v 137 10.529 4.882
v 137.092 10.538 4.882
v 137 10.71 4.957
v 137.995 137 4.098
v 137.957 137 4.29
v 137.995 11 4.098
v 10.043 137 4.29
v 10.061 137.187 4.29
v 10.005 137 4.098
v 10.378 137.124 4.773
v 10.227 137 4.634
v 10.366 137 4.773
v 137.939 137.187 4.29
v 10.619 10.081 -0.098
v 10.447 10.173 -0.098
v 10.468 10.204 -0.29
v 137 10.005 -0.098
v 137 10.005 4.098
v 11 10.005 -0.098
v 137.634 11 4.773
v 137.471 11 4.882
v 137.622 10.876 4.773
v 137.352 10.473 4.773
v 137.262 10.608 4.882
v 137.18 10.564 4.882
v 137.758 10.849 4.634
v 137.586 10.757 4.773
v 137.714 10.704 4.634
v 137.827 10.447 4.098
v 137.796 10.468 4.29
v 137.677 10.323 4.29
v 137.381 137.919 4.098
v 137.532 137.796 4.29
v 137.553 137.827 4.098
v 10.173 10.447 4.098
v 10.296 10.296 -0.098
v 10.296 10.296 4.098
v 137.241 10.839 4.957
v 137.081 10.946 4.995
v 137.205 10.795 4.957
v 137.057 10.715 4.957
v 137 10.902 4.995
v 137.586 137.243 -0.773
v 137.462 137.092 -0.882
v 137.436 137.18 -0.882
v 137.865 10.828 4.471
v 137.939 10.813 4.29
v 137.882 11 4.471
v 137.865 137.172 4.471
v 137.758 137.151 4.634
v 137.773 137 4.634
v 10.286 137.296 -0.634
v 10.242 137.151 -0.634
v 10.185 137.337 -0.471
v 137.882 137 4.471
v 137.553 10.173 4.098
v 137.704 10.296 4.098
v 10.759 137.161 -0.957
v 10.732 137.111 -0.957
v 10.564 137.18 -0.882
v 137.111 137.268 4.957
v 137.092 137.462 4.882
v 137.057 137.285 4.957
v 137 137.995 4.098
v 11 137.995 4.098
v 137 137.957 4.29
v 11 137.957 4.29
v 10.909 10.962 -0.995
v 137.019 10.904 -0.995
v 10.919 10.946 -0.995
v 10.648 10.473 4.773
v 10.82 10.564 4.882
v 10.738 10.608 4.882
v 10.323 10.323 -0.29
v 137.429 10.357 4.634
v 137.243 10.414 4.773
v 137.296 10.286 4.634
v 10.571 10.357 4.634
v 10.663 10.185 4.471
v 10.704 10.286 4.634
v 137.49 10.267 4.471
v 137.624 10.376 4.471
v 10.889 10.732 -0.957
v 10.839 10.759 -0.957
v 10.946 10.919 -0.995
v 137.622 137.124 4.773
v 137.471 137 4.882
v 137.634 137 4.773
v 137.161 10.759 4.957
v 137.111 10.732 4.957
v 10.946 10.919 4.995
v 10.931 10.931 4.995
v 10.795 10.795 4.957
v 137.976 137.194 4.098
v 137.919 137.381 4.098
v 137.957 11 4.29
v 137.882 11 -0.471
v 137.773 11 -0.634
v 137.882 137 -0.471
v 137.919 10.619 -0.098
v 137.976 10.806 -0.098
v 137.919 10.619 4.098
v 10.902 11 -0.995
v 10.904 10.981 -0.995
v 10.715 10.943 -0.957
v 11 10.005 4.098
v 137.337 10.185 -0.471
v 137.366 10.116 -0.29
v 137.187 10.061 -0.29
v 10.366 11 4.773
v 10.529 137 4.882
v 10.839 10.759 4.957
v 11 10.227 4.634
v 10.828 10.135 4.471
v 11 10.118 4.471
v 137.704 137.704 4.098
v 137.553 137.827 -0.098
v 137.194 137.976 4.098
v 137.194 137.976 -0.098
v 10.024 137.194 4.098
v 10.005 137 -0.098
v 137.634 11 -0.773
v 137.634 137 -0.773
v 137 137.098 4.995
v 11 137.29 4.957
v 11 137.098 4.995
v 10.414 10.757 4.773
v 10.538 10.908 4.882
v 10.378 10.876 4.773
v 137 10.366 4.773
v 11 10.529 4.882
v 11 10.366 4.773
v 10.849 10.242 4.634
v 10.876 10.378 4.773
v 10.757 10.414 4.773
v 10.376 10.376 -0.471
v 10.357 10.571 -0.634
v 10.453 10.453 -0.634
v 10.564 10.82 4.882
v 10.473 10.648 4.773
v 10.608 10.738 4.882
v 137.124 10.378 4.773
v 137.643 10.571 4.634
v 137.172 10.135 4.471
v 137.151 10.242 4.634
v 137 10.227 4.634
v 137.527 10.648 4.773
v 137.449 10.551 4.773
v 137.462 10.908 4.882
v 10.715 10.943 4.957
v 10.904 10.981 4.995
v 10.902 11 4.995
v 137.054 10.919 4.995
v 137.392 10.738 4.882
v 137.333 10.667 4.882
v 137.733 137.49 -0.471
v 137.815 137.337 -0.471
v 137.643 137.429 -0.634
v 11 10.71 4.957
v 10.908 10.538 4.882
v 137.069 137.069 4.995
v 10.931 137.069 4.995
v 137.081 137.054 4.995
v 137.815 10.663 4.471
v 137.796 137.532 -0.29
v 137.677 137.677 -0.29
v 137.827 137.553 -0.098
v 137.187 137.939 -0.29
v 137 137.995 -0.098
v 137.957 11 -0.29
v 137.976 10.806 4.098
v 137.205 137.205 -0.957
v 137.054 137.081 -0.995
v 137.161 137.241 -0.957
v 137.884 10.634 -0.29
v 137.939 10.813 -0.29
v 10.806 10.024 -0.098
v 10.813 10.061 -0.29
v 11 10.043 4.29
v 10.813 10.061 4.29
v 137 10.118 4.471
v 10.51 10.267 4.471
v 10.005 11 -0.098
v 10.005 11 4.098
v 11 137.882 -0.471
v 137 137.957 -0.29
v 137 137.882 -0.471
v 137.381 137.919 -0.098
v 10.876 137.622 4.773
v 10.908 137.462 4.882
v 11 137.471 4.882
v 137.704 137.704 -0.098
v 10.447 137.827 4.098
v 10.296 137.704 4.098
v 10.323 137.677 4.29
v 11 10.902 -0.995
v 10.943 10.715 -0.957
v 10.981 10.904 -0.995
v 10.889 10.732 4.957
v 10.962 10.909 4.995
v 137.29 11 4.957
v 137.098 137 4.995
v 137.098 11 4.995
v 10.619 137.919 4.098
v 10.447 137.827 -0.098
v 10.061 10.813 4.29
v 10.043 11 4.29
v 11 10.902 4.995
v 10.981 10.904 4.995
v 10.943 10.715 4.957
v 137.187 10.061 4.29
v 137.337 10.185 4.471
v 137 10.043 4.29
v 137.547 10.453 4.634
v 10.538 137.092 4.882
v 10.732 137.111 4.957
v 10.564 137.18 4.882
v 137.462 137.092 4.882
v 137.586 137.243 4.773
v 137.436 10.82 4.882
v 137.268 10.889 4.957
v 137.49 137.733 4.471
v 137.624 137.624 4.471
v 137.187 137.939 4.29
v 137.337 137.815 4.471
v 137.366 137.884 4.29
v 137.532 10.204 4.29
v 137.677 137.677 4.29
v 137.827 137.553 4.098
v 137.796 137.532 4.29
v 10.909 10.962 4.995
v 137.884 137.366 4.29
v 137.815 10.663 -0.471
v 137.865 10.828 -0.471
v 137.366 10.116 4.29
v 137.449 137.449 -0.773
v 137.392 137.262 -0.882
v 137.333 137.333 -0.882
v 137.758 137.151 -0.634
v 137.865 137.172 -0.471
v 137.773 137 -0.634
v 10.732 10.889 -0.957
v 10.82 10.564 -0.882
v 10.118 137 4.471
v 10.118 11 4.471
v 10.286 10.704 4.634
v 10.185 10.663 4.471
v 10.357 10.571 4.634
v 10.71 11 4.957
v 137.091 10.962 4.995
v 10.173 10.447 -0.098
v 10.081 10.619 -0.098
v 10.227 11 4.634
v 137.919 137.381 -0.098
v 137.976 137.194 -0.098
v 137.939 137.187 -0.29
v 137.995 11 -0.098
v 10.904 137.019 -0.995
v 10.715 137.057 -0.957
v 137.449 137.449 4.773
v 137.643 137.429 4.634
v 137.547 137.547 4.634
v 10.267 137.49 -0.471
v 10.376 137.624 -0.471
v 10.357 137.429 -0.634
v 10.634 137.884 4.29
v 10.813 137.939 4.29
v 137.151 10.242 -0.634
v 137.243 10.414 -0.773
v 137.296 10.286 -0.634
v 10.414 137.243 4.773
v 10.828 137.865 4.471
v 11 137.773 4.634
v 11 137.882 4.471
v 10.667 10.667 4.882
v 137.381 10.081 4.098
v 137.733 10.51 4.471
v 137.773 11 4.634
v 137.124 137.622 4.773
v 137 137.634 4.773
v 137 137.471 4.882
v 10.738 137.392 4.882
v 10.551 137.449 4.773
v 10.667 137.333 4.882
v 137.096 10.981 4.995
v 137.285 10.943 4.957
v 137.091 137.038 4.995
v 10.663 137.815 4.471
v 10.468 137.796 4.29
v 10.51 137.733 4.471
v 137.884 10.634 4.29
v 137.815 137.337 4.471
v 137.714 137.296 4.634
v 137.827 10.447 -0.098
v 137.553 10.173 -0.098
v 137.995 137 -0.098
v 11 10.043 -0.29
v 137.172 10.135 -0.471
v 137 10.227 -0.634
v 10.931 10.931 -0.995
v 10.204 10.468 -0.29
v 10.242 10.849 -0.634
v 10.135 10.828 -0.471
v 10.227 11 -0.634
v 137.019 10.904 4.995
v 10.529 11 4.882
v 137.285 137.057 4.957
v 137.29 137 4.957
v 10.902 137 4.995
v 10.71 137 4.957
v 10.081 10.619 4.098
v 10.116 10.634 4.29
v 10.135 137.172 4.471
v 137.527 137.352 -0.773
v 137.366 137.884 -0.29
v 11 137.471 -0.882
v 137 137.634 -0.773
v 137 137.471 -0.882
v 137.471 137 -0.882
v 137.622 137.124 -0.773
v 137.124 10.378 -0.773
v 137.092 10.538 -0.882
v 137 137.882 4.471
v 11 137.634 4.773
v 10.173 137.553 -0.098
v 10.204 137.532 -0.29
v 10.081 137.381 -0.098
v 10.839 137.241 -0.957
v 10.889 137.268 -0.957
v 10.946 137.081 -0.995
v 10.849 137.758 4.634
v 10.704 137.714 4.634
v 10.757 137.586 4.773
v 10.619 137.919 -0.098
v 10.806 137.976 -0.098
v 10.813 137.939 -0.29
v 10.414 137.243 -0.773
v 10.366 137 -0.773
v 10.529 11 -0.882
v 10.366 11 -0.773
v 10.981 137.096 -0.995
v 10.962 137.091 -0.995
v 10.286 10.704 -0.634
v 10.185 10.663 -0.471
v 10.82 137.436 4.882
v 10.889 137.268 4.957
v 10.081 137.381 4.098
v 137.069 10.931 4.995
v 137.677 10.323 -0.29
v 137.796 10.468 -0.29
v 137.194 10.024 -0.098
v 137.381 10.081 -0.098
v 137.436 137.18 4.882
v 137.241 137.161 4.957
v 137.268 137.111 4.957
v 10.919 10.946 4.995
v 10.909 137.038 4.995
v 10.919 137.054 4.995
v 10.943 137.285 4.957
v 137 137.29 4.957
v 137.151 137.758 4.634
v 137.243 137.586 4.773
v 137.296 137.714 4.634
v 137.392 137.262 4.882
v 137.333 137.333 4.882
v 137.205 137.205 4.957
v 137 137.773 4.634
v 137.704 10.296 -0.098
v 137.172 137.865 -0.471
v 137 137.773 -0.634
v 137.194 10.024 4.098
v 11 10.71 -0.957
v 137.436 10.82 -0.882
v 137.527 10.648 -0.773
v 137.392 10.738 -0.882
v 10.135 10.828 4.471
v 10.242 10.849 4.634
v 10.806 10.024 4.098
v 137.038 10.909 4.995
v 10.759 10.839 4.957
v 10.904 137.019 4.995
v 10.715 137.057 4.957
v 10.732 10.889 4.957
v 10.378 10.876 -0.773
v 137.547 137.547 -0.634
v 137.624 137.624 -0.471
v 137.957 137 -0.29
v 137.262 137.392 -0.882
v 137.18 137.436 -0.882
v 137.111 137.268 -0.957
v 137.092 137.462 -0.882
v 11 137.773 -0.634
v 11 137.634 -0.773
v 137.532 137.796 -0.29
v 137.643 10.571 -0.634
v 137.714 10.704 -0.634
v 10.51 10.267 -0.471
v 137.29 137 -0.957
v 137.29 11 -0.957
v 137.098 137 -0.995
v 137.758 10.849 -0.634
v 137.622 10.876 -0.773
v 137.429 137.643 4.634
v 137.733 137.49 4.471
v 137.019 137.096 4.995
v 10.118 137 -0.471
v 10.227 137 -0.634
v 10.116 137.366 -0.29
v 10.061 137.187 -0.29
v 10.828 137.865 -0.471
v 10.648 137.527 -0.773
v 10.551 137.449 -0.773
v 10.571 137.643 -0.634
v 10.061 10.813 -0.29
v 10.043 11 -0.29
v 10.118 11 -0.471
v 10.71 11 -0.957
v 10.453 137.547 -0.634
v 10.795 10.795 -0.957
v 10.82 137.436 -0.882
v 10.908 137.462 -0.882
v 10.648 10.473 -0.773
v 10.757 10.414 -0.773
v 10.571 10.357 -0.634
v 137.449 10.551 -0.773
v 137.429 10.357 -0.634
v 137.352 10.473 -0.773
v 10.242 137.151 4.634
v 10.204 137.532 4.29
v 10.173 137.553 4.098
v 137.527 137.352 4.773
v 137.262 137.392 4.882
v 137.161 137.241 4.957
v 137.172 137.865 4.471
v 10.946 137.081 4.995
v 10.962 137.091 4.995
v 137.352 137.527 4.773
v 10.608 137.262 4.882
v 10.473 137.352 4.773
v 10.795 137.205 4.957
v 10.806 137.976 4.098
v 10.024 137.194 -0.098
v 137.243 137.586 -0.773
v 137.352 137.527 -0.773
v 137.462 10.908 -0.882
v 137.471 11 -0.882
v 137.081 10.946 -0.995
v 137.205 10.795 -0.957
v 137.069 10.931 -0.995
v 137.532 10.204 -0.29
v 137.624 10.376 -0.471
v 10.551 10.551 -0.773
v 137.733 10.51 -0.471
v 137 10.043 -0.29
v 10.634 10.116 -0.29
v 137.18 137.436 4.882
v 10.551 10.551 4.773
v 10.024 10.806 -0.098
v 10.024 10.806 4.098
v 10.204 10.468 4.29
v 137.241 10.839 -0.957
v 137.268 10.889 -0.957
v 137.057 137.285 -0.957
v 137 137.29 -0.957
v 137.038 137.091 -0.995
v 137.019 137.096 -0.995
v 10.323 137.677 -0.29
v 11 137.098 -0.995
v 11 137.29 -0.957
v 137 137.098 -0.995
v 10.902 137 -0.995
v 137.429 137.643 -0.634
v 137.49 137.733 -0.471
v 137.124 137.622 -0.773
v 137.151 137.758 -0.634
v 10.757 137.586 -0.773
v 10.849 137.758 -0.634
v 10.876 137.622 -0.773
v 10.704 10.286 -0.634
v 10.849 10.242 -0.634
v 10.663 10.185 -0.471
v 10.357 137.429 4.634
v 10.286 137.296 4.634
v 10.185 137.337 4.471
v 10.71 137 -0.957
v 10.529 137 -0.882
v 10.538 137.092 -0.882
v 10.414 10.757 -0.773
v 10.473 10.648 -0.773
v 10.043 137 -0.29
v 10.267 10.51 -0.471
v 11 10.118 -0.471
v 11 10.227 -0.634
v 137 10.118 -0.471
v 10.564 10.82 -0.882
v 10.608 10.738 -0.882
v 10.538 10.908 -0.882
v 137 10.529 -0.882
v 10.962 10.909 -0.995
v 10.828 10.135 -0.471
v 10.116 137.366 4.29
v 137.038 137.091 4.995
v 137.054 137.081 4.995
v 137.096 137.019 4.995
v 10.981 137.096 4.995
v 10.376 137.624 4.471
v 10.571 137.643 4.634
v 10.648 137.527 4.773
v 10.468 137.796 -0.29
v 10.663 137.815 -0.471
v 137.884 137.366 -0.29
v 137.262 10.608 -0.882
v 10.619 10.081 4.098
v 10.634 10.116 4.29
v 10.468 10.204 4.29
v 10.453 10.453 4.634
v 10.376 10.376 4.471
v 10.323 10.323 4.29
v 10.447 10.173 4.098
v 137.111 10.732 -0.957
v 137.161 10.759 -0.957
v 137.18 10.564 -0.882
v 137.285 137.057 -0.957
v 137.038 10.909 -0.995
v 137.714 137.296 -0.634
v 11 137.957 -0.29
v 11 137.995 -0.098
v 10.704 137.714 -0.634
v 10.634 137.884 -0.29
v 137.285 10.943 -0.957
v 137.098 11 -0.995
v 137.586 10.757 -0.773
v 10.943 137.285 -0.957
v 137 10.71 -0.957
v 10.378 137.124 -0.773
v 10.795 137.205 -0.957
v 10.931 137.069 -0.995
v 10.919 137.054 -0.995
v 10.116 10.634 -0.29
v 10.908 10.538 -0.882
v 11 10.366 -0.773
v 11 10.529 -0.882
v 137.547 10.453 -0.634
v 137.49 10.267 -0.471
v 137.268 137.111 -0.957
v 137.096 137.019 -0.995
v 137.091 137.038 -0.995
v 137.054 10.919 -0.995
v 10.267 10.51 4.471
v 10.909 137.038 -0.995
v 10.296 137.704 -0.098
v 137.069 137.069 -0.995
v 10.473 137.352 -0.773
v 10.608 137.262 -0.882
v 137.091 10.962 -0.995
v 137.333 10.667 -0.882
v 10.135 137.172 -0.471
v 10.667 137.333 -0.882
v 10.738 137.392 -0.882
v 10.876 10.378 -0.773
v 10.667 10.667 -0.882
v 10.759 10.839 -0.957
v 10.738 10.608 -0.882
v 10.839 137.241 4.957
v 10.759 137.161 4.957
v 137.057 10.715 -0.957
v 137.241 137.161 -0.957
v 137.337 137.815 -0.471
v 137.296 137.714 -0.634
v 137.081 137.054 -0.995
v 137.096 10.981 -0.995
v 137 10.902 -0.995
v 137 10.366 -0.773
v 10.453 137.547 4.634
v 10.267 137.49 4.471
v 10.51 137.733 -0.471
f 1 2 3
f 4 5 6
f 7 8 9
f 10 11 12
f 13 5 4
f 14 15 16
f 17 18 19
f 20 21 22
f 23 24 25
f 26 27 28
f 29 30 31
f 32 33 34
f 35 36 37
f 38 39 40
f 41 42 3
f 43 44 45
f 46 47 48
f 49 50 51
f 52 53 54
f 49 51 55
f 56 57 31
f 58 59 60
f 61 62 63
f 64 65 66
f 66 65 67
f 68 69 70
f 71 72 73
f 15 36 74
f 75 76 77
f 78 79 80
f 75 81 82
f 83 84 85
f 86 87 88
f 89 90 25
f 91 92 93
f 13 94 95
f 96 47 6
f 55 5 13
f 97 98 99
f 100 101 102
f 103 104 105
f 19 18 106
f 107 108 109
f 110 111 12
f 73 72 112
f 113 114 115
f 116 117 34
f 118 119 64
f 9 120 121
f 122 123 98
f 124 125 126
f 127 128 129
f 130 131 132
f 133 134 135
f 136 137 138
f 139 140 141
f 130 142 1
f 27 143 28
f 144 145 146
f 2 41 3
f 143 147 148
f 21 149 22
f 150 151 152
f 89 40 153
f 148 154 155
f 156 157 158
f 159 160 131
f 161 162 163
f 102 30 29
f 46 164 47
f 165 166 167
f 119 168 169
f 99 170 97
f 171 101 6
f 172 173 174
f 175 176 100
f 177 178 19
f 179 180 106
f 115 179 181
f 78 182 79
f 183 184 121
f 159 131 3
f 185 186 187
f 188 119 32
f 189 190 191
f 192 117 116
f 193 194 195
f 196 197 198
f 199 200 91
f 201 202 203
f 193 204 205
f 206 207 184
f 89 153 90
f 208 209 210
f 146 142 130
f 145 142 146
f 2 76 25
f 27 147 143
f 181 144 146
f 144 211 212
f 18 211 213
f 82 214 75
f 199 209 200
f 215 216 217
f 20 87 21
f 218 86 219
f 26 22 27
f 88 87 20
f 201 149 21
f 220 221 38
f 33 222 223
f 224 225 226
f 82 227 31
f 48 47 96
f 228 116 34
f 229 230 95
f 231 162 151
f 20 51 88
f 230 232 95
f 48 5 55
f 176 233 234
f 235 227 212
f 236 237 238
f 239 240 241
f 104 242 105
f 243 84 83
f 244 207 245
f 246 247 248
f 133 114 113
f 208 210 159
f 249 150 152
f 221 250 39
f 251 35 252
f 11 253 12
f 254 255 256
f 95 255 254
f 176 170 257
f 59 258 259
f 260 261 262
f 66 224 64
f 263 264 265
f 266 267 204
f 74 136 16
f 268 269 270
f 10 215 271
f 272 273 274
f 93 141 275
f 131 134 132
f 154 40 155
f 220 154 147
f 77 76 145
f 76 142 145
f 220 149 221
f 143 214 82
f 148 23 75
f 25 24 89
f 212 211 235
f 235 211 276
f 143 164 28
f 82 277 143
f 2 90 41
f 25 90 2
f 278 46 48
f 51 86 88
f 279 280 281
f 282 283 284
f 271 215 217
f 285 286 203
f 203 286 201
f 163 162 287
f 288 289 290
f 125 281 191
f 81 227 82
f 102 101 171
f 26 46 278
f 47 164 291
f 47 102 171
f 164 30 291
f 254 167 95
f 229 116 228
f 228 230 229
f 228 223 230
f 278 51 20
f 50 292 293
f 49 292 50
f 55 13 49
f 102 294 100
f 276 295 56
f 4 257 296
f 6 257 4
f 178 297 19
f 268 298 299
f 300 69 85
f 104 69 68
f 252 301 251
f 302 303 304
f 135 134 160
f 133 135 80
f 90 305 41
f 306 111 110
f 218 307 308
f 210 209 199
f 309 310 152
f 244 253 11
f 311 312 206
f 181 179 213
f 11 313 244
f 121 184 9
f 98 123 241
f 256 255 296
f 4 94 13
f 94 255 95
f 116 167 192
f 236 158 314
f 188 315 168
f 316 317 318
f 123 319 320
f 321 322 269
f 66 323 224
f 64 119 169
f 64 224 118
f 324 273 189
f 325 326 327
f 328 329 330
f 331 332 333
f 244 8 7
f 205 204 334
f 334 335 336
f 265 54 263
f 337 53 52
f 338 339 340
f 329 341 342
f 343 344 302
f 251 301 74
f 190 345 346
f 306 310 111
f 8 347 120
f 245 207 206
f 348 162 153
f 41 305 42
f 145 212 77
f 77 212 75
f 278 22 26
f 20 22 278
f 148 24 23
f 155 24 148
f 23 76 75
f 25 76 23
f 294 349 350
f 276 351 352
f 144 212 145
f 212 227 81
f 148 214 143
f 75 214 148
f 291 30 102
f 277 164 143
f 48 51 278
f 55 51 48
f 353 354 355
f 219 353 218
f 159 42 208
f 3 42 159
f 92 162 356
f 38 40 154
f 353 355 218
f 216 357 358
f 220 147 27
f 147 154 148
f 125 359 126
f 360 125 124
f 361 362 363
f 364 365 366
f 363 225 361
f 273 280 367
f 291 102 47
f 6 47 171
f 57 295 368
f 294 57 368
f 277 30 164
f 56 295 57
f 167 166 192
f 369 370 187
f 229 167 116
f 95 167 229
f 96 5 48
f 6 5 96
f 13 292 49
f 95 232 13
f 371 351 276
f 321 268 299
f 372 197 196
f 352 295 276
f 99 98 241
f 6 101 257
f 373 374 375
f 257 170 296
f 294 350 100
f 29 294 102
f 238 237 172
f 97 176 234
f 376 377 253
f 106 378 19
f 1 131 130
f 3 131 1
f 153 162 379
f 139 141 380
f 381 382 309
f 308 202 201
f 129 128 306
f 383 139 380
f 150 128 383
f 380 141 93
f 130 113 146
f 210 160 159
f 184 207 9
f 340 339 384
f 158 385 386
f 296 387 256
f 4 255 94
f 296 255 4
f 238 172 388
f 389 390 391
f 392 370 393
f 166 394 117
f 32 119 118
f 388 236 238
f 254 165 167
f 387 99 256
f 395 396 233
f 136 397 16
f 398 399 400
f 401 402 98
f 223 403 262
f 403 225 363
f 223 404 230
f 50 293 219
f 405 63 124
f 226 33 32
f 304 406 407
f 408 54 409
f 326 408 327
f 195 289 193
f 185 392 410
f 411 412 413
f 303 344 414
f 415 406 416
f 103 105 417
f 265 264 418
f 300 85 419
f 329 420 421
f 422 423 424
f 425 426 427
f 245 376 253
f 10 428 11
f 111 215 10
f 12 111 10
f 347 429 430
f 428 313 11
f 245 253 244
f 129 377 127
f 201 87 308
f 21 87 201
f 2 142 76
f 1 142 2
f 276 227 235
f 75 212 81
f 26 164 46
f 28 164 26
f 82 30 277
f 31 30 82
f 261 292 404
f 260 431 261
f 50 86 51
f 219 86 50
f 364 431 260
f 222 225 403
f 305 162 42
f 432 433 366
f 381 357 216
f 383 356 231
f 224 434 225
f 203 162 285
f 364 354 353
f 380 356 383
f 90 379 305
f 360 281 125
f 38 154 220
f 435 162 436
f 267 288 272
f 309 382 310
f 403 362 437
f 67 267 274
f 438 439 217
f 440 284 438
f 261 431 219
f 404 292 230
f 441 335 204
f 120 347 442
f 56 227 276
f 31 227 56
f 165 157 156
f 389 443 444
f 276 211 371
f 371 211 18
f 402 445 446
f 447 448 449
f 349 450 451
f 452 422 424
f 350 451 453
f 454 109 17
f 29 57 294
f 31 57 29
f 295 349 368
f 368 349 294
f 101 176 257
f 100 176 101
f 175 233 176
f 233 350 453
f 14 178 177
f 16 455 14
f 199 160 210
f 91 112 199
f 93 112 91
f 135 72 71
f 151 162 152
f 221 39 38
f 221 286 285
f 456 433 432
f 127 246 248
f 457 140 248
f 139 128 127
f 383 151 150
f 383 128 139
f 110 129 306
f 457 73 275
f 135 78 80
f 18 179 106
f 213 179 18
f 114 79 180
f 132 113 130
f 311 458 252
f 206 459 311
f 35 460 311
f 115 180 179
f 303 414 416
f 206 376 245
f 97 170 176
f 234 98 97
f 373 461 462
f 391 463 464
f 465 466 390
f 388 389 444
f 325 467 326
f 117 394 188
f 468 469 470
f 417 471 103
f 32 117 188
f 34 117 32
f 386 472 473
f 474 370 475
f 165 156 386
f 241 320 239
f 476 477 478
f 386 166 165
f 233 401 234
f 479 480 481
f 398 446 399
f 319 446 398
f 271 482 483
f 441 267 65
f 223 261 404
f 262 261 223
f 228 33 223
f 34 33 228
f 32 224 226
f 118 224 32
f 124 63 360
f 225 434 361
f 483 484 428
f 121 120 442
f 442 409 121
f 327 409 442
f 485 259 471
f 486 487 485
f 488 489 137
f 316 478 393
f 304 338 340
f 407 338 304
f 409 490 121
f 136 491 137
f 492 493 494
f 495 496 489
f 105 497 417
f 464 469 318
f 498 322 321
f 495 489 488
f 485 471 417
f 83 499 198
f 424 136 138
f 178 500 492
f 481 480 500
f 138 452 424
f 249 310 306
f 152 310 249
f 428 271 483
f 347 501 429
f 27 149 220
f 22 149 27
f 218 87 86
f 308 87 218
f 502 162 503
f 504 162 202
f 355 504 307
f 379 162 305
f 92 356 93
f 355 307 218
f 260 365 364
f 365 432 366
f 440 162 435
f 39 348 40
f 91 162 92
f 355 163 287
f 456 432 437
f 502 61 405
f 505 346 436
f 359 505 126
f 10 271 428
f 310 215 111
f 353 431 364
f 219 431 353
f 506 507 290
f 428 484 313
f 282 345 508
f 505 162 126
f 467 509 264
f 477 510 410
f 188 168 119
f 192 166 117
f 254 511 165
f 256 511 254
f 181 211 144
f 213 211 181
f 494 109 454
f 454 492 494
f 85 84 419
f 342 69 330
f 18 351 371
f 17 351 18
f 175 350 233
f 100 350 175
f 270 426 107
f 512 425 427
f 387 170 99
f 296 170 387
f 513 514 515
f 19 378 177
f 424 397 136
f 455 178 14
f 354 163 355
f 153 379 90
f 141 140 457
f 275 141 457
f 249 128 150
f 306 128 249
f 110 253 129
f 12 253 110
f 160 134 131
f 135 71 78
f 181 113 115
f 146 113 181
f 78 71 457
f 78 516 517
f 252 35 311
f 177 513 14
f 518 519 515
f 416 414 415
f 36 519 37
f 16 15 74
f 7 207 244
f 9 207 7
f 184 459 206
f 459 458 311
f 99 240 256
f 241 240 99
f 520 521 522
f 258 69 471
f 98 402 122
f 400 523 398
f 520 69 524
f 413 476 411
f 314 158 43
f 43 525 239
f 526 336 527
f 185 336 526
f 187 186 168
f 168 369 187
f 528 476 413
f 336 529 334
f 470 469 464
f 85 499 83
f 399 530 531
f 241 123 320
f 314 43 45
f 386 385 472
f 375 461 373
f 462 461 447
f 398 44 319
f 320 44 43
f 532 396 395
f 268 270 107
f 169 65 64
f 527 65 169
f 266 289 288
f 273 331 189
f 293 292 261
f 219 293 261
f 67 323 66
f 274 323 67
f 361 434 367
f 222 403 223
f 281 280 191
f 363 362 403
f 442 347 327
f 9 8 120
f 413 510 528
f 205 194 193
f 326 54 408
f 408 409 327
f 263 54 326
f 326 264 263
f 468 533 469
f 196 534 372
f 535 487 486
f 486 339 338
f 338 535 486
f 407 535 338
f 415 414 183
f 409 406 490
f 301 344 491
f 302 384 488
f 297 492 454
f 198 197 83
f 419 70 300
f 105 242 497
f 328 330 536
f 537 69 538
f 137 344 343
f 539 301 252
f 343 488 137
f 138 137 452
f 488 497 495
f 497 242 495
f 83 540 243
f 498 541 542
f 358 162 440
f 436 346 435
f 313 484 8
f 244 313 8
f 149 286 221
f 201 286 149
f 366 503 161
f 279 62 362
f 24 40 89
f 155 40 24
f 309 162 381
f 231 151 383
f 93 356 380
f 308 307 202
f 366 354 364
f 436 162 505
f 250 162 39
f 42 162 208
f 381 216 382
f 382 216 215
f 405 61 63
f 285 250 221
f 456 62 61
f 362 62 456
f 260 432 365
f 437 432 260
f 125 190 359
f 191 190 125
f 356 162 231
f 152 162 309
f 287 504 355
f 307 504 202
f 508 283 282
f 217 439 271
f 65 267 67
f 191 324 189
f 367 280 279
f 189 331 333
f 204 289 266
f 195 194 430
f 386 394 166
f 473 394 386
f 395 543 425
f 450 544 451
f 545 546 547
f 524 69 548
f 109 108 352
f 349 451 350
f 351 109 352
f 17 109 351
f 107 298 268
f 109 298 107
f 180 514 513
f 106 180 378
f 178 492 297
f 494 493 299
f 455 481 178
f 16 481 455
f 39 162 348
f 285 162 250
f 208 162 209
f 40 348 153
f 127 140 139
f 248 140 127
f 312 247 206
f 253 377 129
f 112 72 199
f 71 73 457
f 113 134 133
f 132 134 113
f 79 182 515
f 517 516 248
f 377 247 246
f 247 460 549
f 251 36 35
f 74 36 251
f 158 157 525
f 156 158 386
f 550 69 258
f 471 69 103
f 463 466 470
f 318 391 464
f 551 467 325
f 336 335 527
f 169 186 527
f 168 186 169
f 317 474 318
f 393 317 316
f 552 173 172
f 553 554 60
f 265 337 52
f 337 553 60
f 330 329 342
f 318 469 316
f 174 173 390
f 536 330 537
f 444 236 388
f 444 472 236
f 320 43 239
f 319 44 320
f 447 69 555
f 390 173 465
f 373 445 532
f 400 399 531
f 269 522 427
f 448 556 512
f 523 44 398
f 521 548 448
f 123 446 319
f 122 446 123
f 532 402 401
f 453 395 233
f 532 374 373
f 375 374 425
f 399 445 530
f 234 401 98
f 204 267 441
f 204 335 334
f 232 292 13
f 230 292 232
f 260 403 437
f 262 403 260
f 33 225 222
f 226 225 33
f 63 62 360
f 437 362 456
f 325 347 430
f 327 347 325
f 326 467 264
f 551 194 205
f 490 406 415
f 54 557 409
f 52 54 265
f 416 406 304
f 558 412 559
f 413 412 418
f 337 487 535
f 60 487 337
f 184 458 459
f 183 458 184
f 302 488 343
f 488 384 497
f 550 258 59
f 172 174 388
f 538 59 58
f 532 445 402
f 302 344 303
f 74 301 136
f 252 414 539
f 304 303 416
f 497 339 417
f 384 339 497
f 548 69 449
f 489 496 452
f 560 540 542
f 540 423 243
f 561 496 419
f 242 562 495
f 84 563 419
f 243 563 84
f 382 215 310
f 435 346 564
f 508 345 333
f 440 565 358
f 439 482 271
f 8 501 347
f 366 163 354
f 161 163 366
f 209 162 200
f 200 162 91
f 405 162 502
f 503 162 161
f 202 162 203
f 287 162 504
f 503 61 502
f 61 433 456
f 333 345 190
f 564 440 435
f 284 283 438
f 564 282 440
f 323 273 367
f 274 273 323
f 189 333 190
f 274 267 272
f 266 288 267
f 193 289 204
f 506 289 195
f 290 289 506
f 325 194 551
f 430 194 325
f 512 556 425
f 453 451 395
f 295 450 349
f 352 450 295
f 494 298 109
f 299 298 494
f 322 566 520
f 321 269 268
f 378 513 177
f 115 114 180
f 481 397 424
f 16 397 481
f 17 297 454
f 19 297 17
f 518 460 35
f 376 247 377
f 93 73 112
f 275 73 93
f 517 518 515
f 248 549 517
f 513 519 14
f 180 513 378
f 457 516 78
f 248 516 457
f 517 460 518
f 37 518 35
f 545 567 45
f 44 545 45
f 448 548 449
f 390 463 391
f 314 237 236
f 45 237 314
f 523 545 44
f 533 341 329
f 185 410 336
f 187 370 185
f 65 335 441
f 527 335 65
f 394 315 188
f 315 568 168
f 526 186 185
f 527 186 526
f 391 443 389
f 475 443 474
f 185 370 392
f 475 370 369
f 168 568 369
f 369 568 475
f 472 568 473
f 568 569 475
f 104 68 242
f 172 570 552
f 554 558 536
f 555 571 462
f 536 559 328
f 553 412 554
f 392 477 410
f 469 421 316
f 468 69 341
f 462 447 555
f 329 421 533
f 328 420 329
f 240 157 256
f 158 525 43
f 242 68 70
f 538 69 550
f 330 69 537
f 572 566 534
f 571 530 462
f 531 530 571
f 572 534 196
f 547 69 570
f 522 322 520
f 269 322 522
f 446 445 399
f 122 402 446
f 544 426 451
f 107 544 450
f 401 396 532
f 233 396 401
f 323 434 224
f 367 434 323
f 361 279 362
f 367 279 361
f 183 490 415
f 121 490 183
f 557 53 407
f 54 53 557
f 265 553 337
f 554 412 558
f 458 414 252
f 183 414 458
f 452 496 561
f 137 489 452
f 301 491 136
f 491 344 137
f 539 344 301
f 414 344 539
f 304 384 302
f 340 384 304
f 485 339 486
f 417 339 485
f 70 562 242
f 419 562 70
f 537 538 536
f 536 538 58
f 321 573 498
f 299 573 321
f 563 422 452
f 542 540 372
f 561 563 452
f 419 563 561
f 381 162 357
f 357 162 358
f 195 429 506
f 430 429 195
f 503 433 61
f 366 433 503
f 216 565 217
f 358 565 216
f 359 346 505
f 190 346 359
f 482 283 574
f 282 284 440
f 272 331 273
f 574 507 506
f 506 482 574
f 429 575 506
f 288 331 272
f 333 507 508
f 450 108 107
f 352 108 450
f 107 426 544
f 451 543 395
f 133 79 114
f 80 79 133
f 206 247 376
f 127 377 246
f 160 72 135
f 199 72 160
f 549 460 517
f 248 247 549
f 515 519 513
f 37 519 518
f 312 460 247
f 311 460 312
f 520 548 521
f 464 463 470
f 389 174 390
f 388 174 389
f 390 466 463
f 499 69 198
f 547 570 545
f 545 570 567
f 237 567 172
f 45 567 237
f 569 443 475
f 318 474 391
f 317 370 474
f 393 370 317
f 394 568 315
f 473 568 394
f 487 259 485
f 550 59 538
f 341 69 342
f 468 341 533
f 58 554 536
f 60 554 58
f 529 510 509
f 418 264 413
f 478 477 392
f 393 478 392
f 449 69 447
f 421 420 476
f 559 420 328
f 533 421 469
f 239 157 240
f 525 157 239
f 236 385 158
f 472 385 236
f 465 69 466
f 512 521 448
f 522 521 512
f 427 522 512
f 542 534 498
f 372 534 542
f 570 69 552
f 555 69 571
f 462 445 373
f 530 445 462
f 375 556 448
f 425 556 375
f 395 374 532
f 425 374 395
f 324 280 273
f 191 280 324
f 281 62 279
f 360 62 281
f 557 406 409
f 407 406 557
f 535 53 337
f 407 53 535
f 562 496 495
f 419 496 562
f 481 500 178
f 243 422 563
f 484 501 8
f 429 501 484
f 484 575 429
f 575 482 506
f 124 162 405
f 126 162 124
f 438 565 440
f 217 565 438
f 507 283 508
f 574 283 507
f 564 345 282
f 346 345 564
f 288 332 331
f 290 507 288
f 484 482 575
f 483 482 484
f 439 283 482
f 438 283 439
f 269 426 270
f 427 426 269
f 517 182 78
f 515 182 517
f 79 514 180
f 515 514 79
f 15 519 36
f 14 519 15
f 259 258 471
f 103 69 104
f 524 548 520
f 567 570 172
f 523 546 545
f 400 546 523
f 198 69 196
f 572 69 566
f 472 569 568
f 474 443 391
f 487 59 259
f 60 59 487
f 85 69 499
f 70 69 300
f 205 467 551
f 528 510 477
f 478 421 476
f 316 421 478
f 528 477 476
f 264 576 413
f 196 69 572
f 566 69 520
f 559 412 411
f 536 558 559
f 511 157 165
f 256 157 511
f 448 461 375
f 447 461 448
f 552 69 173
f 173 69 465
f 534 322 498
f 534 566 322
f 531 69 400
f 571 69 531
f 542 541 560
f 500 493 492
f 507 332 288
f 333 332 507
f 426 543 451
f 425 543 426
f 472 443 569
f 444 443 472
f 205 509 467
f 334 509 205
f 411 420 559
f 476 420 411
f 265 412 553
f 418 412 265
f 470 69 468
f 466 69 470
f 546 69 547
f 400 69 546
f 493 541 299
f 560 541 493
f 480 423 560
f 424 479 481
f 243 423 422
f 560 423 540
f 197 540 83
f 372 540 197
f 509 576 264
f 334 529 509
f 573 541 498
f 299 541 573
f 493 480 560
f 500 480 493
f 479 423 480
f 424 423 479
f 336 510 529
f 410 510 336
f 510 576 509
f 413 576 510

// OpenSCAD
$fn=32;

// Basic dimensions of the dish
width=90;
depth=80;
height=20;
wall=3;

// Inside and outside fillets
m_outer=5;
m_inner=10;

// Radius of handle style 1
r_handle=20;

trivet(width,depth,5);
//translate([(width/2),r_handle/3,height*0.7])
//    handle_1(r_handle);


/**
 * A semicircular handle with a bit of an undercut
*/
module handle_1(r) {
    
    minkowski() {
        difference() {
            cylinder(3,r,r);
            cylinder(3,r,0);
            translate([-r,-r/3,0]) cube([r*2,r*2,3]);
        }
        sphere(r=1);
    }
    
}

module dish() {
    difference() {
        dish_block(width,depth,height,m_outer);
        i_w=width-wall-wall;
        d_w=depth-wall-wall;
        translate([wall,wall,wall]) dish_block(i_w,d_w,height,m_inner);
    }
}

module dish_block(w,d,h,r) {
    difference(){
        
        translate([r,r,r]) minkowski() {
            cube([w-r-r,d-r-r,h-r]);
            sphere(r=r);
        }
            
        
        translate([0,0,h])  cube([w,d,h]);
        
    }
}

module trivet(w,d,h) {
    r=10;
    s=r+1;
    
    bar=2;
    
   
    minkowski() {
        {
            for ( i=[1:5] ) {
                translate([i*s,0,0]) cube([bar,d,bar]);
            }
    
            for ( i=[1:5] ) {
                translate([0, i*s,0]) cube([d, bar,bar]);
            }
        }
        sphere(r=1);
    }
    
    

}
